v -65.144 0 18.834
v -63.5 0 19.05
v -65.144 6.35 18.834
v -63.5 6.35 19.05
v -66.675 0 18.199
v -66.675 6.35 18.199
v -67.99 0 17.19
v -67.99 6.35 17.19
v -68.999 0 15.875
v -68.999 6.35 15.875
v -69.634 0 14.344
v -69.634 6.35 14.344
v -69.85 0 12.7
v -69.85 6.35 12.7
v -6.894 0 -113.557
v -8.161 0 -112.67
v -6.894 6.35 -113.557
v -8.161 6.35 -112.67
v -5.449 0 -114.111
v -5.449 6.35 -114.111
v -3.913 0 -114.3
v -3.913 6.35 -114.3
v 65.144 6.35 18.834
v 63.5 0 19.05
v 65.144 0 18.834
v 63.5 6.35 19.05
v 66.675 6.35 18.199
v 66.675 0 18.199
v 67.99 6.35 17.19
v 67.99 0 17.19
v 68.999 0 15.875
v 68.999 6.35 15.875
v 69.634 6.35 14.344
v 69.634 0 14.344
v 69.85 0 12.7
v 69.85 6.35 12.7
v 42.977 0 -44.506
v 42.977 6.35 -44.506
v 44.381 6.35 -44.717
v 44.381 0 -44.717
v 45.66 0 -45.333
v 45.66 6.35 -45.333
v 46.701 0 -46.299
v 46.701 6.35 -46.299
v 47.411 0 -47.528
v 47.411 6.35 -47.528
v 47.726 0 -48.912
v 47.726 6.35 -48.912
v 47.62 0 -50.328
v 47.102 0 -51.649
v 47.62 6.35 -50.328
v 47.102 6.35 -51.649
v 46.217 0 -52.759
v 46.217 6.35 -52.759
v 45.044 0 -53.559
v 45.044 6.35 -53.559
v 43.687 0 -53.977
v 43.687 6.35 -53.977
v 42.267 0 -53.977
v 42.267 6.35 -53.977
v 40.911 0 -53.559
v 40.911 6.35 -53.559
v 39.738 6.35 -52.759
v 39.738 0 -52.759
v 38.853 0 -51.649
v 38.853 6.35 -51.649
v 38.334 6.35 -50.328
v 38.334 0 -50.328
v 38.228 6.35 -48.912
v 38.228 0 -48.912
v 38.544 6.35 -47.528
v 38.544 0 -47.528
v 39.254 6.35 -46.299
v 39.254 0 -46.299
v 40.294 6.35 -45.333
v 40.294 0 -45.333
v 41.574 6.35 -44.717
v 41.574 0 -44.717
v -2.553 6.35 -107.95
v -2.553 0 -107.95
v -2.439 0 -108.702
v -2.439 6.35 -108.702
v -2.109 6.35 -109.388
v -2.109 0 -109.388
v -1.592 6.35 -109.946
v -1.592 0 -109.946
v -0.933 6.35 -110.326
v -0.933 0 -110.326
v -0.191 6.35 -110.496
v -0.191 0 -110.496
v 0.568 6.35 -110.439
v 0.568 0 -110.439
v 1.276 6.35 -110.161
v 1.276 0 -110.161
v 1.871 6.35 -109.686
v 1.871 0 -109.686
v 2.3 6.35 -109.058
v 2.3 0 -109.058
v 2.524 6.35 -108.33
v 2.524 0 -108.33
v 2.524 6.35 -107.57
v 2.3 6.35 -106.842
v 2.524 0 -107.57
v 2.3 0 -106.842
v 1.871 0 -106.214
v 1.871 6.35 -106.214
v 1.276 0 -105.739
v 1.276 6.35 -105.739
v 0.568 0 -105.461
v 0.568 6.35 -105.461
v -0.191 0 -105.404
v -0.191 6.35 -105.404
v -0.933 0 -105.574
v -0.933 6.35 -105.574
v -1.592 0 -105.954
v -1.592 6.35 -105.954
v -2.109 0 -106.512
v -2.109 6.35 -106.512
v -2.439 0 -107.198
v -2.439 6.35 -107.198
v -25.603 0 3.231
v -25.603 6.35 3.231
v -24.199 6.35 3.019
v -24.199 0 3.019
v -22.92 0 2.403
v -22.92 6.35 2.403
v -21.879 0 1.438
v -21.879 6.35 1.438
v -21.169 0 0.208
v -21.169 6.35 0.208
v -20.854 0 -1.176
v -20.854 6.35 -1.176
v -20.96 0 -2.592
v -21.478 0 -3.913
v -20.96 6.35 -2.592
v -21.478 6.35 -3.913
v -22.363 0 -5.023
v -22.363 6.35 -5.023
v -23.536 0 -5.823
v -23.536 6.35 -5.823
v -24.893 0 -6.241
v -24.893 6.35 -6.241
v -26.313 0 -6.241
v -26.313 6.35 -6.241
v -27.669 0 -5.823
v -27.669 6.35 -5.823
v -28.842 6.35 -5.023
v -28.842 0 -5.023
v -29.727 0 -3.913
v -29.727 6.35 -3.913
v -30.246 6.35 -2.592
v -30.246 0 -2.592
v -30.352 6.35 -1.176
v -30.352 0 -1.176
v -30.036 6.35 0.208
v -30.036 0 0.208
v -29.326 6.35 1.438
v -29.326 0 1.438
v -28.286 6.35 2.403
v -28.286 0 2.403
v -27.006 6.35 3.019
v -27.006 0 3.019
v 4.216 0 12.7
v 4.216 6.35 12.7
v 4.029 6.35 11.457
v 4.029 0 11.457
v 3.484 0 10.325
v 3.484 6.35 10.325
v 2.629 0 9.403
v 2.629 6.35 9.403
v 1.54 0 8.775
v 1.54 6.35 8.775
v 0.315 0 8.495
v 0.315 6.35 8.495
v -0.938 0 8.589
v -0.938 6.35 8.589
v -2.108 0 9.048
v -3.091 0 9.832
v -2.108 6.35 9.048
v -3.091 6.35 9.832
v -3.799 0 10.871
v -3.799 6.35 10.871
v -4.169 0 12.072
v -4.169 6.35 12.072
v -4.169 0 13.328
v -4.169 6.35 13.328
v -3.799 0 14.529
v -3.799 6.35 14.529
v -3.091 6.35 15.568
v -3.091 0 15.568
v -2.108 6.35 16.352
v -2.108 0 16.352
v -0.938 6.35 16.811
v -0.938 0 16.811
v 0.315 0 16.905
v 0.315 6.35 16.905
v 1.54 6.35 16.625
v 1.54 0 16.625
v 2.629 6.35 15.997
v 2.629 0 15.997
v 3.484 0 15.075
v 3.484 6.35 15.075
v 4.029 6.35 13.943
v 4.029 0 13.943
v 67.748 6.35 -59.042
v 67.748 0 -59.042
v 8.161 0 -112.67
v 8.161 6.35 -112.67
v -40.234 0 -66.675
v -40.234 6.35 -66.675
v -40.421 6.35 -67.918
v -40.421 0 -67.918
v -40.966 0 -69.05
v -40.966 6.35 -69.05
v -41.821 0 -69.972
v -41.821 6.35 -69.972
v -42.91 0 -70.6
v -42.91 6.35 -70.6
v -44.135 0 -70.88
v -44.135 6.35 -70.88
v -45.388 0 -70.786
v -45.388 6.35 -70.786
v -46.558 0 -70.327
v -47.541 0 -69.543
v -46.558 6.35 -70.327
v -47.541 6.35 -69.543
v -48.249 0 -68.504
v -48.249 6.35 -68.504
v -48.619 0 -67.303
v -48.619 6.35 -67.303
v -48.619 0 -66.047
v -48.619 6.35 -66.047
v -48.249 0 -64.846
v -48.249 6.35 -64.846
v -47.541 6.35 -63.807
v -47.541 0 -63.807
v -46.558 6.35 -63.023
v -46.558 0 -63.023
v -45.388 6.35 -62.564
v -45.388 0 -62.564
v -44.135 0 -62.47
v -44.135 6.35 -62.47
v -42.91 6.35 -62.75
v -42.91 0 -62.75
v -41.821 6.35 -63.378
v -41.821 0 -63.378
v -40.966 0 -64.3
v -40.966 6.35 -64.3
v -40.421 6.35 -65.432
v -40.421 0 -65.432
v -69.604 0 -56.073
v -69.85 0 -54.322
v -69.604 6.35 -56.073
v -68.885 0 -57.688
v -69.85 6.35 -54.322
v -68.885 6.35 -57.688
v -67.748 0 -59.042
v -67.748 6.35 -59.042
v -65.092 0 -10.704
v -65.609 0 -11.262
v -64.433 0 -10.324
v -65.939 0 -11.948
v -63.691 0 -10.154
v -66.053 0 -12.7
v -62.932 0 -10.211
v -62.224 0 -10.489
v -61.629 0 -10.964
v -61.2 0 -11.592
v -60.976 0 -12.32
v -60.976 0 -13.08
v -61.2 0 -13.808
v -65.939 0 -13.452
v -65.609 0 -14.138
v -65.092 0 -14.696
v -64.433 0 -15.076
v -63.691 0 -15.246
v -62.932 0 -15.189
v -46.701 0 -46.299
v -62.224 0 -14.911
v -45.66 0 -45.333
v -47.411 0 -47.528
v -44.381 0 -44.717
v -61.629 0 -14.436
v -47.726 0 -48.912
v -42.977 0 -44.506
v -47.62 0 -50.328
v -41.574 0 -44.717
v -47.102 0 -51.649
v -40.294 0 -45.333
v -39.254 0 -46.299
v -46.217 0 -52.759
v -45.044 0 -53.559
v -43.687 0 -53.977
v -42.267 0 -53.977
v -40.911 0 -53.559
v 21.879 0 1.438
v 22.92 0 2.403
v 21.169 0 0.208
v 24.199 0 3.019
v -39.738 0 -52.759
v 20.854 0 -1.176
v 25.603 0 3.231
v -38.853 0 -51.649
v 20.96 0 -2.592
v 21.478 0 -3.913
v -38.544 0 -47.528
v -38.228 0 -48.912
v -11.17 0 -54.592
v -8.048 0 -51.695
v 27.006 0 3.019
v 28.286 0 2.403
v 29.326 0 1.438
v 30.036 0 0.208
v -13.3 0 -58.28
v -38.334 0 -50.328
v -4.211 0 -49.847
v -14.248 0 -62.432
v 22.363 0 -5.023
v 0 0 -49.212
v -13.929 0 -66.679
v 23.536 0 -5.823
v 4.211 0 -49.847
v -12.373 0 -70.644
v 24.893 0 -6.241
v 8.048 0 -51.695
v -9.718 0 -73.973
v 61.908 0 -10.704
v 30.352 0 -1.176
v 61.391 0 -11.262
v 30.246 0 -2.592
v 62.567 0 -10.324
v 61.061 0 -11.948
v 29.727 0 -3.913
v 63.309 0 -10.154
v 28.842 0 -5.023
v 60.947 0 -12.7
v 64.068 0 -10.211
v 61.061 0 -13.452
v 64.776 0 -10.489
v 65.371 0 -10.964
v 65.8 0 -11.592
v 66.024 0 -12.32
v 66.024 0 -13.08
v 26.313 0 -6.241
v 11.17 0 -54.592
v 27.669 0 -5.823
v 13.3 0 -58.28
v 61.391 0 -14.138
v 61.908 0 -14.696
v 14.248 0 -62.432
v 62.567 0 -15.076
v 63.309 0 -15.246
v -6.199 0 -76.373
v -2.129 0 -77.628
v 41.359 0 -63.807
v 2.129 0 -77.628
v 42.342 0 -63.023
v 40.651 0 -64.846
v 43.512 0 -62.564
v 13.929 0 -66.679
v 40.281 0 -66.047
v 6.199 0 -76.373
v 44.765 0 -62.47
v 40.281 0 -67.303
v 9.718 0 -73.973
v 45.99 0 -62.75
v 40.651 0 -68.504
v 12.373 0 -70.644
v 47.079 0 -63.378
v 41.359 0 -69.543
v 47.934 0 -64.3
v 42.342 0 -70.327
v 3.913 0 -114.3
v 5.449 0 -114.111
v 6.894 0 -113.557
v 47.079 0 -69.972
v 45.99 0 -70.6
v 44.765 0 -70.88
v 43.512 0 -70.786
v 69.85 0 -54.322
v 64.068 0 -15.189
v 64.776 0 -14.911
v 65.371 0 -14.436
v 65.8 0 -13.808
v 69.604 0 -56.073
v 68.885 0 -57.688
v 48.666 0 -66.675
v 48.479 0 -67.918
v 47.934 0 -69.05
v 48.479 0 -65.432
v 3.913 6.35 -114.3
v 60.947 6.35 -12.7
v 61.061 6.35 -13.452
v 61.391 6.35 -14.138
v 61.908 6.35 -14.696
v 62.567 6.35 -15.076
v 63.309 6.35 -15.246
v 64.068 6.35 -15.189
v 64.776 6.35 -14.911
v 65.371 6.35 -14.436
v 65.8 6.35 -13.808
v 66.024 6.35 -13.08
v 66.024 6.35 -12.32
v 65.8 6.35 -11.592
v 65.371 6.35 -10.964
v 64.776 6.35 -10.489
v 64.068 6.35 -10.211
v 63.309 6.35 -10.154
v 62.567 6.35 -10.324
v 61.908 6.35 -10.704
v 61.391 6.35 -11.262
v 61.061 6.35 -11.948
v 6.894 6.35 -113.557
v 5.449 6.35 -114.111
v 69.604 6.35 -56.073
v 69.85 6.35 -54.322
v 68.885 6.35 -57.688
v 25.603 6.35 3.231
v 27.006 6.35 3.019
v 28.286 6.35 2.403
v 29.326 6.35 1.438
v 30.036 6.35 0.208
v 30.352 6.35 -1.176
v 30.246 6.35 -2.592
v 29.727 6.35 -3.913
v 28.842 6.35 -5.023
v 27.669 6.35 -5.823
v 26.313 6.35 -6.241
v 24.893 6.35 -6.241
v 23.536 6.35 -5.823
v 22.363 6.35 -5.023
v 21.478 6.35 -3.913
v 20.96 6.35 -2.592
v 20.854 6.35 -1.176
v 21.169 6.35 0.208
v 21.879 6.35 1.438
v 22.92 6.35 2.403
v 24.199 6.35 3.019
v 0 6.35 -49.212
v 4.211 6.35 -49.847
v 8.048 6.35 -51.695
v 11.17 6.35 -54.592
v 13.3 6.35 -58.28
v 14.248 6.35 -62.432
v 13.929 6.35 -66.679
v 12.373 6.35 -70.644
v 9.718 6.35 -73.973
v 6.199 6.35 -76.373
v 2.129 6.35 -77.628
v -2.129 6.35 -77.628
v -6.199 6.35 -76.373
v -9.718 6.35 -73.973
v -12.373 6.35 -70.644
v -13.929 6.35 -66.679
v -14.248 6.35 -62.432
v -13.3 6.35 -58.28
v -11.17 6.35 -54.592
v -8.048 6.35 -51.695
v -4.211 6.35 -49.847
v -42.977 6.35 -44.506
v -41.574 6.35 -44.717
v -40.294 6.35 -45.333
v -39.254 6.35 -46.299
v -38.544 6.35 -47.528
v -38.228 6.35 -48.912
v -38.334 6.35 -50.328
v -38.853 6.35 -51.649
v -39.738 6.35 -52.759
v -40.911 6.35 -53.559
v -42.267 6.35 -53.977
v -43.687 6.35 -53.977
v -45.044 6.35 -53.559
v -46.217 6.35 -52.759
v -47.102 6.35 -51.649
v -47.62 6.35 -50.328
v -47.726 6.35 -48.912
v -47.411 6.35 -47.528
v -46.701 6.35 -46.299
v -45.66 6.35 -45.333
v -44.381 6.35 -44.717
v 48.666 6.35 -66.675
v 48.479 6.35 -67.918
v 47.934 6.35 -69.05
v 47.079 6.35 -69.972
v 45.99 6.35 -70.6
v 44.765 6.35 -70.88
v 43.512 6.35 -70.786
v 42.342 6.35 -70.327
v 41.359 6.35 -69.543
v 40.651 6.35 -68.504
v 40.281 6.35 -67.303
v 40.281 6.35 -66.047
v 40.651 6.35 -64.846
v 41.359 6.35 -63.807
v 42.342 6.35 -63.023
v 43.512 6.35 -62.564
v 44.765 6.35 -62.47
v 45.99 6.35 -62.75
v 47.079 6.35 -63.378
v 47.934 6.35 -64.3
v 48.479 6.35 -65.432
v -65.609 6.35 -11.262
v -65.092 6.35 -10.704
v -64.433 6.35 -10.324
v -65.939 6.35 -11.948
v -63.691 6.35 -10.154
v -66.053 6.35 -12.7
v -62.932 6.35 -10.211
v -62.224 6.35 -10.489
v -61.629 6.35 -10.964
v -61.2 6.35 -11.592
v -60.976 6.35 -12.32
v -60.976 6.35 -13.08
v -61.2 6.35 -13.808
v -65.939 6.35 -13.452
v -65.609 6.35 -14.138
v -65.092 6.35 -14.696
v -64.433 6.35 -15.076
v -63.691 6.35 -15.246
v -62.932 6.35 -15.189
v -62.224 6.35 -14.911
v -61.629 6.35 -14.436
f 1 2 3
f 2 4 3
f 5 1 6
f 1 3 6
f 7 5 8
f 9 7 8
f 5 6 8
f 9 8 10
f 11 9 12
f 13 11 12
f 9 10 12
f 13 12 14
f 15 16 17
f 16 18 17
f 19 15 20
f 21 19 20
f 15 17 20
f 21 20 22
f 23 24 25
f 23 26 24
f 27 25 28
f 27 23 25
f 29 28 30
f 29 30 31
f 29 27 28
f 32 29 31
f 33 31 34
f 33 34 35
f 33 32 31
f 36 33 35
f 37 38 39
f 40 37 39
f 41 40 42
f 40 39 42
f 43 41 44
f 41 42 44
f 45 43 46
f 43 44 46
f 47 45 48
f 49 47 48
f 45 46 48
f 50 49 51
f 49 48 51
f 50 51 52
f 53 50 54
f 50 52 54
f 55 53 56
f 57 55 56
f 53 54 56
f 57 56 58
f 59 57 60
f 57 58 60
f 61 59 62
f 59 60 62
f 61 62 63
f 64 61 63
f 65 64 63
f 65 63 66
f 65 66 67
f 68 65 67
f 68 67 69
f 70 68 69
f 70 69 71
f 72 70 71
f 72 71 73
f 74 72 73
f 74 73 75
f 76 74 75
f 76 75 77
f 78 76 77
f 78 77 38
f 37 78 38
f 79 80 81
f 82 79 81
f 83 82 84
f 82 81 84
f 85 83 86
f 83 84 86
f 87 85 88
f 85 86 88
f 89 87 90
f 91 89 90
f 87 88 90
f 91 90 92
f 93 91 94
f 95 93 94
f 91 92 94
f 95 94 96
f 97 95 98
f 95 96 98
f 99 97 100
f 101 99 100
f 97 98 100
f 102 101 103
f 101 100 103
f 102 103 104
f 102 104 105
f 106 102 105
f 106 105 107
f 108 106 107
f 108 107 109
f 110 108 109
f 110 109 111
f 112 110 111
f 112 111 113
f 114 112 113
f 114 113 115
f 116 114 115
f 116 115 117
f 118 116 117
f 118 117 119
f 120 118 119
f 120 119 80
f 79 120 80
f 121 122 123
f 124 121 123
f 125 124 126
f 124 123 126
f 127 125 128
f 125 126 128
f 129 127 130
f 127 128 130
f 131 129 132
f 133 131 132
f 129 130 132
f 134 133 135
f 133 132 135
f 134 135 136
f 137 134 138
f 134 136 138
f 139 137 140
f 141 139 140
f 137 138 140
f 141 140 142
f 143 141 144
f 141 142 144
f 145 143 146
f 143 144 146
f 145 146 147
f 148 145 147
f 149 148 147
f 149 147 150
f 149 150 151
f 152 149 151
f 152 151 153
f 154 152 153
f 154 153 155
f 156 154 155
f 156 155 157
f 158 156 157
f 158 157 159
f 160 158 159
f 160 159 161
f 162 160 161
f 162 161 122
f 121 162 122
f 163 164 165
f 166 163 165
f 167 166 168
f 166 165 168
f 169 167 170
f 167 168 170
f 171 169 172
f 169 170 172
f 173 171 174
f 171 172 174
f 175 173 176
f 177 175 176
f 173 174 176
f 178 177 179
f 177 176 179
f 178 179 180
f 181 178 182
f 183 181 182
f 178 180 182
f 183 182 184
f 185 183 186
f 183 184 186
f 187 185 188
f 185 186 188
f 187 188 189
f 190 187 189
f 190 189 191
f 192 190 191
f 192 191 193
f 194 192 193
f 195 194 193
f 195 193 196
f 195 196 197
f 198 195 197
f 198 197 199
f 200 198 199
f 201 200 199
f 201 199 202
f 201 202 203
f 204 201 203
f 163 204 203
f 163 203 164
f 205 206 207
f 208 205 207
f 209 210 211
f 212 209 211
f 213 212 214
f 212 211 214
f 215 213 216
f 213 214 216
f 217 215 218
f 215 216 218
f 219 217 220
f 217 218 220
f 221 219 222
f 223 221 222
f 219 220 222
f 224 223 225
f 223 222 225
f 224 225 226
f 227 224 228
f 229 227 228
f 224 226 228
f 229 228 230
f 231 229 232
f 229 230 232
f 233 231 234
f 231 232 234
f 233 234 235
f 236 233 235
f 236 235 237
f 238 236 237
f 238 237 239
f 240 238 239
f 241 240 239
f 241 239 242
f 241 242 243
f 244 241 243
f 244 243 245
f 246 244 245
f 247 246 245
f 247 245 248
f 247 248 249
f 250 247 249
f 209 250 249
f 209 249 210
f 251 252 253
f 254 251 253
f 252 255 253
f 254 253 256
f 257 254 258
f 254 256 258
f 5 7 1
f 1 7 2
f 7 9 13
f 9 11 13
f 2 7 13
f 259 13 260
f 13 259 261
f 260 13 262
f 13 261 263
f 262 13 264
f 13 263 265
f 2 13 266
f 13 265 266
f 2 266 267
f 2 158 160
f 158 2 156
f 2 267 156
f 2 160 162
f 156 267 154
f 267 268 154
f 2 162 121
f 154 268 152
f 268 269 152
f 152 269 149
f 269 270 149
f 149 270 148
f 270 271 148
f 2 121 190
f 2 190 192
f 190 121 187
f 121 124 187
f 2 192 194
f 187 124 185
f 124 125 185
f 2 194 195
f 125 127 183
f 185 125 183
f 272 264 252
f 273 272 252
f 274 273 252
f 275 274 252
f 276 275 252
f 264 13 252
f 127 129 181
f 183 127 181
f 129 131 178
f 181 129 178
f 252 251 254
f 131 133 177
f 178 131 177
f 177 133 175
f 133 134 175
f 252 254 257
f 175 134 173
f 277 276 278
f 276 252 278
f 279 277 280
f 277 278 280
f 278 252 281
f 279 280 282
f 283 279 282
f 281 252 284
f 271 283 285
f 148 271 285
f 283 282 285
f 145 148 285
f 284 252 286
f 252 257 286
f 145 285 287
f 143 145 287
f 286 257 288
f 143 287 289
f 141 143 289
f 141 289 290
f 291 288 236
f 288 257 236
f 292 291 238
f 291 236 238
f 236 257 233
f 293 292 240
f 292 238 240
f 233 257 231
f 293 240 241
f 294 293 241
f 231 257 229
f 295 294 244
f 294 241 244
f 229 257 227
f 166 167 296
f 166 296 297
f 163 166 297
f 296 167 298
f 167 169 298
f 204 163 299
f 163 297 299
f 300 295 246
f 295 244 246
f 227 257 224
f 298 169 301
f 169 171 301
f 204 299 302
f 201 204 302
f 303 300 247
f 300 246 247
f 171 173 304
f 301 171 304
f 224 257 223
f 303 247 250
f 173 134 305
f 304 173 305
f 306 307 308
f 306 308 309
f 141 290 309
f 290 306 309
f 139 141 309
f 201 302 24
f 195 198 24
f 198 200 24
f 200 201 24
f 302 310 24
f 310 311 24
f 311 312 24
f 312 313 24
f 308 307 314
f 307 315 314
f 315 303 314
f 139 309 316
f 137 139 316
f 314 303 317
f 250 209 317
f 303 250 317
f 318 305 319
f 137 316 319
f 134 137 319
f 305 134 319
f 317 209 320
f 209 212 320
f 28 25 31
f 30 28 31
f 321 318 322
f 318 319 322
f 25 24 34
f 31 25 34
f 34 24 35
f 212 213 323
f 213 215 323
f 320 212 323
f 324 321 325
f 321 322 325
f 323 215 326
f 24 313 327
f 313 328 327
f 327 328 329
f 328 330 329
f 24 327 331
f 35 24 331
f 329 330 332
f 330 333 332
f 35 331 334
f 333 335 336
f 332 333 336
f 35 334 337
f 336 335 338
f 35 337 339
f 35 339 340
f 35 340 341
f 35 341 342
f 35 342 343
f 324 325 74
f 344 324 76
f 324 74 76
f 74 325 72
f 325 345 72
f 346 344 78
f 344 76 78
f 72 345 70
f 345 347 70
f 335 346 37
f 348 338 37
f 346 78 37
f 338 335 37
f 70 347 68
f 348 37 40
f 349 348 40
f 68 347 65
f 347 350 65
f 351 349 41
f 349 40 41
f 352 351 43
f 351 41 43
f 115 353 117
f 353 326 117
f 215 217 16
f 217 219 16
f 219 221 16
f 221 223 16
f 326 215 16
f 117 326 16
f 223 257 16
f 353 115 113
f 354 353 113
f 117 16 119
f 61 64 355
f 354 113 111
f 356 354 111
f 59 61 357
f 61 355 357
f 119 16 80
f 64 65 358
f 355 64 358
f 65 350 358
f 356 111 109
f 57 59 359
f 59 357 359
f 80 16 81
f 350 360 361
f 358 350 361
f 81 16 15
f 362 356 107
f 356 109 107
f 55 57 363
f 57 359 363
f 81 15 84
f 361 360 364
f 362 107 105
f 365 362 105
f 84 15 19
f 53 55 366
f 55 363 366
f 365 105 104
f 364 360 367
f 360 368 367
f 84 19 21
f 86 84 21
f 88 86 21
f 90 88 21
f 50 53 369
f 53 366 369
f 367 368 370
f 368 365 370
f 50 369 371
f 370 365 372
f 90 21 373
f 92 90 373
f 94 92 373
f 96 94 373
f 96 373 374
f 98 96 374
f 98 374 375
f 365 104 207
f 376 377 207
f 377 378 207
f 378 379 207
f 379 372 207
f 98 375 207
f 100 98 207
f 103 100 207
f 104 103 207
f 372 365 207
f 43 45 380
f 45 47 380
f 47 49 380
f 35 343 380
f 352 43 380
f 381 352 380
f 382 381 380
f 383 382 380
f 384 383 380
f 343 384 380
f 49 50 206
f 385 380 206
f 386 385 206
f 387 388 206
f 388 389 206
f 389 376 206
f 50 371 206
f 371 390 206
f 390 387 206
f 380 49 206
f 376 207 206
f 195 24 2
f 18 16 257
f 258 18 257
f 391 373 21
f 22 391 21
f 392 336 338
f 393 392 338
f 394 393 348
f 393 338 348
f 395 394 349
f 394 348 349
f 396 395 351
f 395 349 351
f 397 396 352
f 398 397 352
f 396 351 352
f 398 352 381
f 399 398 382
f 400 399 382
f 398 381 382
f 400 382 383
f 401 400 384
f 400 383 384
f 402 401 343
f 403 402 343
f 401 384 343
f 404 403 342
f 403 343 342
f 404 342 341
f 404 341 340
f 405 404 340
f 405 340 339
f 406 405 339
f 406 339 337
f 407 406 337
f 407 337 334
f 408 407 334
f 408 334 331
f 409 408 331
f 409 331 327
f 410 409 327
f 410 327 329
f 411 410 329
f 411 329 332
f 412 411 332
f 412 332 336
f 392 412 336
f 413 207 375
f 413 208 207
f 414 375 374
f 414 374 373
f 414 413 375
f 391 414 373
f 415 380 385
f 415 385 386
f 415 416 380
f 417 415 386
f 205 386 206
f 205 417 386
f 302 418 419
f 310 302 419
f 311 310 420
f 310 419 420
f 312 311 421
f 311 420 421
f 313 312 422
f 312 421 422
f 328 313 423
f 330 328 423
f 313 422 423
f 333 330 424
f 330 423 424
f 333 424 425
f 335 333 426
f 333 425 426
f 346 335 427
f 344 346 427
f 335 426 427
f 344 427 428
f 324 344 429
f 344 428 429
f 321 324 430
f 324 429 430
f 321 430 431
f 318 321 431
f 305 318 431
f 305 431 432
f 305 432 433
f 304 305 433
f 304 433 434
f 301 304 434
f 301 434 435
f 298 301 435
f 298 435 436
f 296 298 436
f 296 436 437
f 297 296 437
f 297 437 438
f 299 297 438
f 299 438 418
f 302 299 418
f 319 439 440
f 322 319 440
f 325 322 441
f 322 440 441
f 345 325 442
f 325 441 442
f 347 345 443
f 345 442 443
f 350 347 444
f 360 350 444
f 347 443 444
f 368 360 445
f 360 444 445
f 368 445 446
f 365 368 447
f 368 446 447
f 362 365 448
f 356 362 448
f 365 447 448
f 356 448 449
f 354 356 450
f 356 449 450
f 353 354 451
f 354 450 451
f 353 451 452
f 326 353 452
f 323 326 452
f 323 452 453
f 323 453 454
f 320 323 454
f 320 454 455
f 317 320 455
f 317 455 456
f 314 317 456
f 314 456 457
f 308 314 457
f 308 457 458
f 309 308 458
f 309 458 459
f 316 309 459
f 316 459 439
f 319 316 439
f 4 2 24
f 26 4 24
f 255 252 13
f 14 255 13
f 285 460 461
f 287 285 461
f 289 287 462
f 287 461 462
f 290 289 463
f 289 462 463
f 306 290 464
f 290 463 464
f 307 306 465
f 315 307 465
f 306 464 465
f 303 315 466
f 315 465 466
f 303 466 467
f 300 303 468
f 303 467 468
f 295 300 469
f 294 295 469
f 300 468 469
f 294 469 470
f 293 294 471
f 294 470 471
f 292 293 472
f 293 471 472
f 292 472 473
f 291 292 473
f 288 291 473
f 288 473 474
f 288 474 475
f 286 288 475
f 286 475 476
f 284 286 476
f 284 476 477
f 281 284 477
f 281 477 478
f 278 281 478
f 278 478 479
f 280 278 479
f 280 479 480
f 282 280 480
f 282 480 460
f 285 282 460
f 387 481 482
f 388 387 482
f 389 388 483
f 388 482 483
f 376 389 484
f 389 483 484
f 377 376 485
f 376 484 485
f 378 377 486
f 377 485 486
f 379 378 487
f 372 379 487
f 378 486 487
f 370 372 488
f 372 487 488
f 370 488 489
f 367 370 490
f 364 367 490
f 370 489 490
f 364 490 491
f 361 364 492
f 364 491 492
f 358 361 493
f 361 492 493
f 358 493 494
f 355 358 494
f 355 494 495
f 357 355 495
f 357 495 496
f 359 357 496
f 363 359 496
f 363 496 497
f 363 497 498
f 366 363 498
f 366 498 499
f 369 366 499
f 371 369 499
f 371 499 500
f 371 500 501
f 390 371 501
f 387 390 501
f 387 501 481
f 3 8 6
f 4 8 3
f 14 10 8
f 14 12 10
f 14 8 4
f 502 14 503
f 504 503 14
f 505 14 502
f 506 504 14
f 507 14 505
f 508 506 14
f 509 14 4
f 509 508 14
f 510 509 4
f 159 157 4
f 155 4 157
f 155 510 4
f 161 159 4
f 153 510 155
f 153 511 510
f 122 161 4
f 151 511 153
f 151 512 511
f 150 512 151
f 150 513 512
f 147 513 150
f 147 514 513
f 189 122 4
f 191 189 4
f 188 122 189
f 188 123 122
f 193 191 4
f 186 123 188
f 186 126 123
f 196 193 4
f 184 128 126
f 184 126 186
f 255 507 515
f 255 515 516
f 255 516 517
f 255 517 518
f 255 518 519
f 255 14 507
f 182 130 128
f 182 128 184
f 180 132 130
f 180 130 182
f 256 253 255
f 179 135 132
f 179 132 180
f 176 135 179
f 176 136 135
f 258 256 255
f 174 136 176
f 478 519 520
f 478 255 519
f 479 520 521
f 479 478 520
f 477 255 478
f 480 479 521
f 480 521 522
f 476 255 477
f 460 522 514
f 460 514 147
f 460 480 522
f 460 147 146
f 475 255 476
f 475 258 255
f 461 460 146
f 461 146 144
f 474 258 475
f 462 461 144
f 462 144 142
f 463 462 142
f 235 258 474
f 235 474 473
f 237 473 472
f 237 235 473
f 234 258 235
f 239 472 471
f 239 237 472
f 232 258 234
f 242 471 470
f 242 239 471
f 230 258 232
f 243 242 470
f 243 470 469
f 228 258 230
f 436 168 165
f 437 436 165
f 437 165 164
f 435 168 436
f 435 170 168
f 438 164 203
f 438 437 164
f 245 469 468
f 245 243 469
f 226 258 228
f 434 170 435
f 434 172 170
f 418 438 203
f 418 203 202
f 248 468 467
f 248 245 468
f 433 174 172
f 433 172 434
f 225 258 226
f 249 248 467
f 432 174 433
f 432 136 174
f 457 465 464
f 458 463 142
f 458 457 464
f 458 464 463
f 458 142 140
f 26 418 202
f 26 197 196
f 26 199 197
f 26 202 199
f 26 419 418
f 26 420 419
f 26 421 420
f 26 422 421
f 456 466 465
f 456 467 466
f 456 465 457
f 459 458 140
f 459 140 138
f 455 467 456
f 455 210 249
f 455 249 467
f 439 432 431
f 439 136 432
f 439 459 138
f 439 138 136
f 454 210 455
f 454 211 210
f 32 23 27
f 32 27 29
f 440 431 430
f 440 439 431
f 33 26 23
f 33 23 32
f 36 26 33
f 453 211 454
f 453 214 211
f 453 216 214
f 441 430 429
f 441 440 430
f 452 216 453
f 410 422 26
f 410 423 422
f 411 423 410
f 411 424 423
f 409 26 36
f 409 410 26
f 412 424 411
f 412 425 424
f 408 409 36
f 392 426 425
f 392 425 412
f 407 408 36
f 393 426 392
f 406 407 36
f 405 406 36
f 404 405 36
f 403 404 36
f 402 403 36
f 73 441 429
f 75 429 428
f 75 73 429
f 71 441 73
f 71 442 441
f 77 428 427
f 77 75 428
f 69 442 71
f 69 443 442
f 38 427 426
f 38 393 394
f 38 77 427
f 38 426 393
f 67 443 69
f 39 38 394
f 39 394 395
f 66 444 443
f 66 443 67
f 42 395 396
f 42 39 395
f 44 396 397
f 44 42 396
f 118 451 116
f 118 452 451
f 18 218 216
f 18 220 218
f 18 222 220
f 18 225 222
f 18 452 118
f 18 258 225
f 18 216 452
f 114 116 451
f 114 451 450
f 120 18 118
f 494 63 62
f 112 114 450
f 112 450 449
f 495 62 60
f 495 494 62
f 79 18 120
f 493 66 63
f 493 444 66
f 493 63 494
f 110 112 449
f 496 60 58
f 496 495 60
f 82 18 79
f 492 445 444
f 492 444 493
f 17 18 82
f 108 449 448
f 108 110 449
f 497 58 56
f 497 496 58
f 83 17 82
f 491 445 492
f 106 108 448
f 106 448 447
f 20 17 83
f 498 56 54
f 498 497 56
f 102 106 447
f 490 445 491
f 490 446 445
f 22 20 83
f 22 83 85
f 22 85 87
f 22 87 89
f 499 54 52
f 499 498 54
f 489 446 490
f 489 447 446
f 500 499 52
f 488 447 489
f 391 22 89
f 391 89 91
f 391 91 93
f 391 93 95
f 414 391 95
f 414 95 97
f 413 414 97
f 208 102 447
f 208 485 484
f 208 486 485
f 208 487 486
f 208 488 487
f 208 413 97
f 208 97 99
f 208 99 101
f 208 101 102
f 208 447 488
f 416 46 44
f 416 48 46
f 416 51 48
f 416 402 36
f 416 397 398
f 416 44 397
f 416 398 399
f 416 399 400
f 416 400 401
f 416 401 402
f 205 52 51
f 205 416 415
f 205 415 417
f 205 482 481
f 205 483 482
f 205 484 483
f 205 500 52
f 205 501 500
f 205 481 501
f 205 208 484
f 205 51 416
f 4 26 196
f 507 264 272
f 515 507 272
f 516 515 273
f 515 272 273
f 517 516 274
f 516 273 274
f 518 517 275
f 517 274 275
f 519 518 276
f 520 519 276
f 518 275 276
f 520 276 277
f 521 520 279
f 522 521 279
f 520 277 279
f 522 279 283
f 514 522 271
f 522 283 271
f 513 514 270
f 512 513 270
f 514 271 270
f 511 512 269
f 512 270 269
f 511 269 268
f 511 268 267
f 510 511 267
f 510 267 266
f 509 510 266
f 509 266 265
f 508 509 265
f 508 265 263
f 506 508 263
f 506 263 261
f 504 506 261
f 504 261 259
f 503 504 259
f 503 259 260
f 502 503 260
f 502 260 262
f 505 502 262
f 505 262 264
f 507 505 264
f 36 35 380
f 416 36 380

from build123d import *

# Parameters (mm, degrees)
BOSS_EXTRUDE1_DEPTH        = 6.35
SKETCH4_R                  = 14.2875
CUT_EXTRUDE2_DEPTH         = 135.10382172
SKETCH5_R                  = 4.7625
CUT_EXTRUDE3_DEPTH         = 50.8
F_10_CLEARANCE_HOLE1_D     = 5.1054
F_10_CLEARANCE_HOLE1_DEPTH = 50.8
F_10_CLEARANCE_HOLE1_TIP   = 1.533816902
FILLET1_R                  = 6.35
F_5_16_CLEARANCE_HOLE1_D   = 8.4328


with BuildPart() as part:
    # Sketch1 → Boss-Extrude1 (new body)
    with BuildSketch(Plane(origin=(0, 0, 0), x_dir=(1, 0, 0), z_dir=(0, 1, 0))):
        Polygon((-69.85, -19.05), (69.85, -19.05), (69.85, 57.15), (6.35, 114.3), (-6.35, 114.3), (-69.85, 57.15), align=None)
    extrude(amount=BOSS_EXTRUDE1_DEPTH)

    # Sketch4 → Cut-Extrude2 (cut, through all)
    with BuildSketch(Plane(origin=(0, 6.35, 0), x_dir=(1, 0, 0), z_dir=(0, 1, 0))):
        with Locations(Location((0, 63.5, 0), (0, 0, 270))):
            Circle(SKETCH4_R)
    extrude(amount=-CUT_EXTRUDE2_DEPTH, mode=Mode.SUBTRACT)

    # Sketch5 → Cut-Extrude3 (cut)
    with BuildSketch(Plane(origin=(0, 6.35, 19.05), x_dir=(-0.9584281674521108, 0, 0.2853339233851958), z_dir=(0, 1, 0))):
        with Locations(Location((21.697168114, -77.740965053, 0), (0, 0, 73.42119018))):
            Circle(SKETCH5_R)
        with Locations(Location((18.665649821, -27.031499499, 0), (0, 0, 73.42119018))):
            Circle(SKETCH5_R)
        with Locations(Location((-30.411025551, -12.420868461, 0), (0, 0, 73.42119018))):
            Circle(SKETCH5_R)
        with Locations(Location((-60.684163962, -53.21519516, 0), (0, 0, 73.42119018))):
            Circle(SKETCH5_R)
    extrude(amount=-CUT_EXTRUDE3_DEPTH, mode=Mode.SUBTRACT)

    # #10 Clearance Hole1
    with Locations(Plane(origin=(0, 6.35, 19.05), x_dir=(1, 0, 0), z_dir=(0, 1, 0))):
        with Locations((-63.5, 31.75), (63.5, 31.75), (0, 127)):
            Hole(F_10_CLEARANCE_HOLE1_D / 2, depth=F_10_CLEARANCE_HOLE1_DEPTH)
            with Locations((0, 0, -(F_10_CLEARANCE_HOLE1_DEPTH + F_10_CLEARANCE_HOLE1_TIP / 2))):  # 118° drill point
                Cone(0, F_10_CLEARANCE_HOLE1_D / 2, F_10_CLEARANCE_HOLE1_TIP, mode=Mode.SUBTRACT)

    # Fillet1
    fillet1_edges = [part.edges().sort_by_distance(p)[0] for p in [
        (-69.85, 3.175, -57.15),
        (-6.35, 3.175, -114.3),
        (6.35, 3.175, -114.3),
        (69.85, 3.175, -57.15),
        (69.85, 3.175, 19.05),
        (-69.85, 3.175, 19.05),
    ]]
    fillet(fillet1_edges, radius=FILLET1_R)

    # 5/16 Clearance Hole1 (through all)
    with Locations(Plane(origin=(0, 0, 19.05), x_dir=(-1, 0, 0), z_dir=(0, -1, 0))):
        with Locations((-44.45, 85.725), (44.45, 85.725), (0, 6.35)):
            Hole(F_5_16_CLEARANCE_HOLE1_D / 2)


solid = part.part
